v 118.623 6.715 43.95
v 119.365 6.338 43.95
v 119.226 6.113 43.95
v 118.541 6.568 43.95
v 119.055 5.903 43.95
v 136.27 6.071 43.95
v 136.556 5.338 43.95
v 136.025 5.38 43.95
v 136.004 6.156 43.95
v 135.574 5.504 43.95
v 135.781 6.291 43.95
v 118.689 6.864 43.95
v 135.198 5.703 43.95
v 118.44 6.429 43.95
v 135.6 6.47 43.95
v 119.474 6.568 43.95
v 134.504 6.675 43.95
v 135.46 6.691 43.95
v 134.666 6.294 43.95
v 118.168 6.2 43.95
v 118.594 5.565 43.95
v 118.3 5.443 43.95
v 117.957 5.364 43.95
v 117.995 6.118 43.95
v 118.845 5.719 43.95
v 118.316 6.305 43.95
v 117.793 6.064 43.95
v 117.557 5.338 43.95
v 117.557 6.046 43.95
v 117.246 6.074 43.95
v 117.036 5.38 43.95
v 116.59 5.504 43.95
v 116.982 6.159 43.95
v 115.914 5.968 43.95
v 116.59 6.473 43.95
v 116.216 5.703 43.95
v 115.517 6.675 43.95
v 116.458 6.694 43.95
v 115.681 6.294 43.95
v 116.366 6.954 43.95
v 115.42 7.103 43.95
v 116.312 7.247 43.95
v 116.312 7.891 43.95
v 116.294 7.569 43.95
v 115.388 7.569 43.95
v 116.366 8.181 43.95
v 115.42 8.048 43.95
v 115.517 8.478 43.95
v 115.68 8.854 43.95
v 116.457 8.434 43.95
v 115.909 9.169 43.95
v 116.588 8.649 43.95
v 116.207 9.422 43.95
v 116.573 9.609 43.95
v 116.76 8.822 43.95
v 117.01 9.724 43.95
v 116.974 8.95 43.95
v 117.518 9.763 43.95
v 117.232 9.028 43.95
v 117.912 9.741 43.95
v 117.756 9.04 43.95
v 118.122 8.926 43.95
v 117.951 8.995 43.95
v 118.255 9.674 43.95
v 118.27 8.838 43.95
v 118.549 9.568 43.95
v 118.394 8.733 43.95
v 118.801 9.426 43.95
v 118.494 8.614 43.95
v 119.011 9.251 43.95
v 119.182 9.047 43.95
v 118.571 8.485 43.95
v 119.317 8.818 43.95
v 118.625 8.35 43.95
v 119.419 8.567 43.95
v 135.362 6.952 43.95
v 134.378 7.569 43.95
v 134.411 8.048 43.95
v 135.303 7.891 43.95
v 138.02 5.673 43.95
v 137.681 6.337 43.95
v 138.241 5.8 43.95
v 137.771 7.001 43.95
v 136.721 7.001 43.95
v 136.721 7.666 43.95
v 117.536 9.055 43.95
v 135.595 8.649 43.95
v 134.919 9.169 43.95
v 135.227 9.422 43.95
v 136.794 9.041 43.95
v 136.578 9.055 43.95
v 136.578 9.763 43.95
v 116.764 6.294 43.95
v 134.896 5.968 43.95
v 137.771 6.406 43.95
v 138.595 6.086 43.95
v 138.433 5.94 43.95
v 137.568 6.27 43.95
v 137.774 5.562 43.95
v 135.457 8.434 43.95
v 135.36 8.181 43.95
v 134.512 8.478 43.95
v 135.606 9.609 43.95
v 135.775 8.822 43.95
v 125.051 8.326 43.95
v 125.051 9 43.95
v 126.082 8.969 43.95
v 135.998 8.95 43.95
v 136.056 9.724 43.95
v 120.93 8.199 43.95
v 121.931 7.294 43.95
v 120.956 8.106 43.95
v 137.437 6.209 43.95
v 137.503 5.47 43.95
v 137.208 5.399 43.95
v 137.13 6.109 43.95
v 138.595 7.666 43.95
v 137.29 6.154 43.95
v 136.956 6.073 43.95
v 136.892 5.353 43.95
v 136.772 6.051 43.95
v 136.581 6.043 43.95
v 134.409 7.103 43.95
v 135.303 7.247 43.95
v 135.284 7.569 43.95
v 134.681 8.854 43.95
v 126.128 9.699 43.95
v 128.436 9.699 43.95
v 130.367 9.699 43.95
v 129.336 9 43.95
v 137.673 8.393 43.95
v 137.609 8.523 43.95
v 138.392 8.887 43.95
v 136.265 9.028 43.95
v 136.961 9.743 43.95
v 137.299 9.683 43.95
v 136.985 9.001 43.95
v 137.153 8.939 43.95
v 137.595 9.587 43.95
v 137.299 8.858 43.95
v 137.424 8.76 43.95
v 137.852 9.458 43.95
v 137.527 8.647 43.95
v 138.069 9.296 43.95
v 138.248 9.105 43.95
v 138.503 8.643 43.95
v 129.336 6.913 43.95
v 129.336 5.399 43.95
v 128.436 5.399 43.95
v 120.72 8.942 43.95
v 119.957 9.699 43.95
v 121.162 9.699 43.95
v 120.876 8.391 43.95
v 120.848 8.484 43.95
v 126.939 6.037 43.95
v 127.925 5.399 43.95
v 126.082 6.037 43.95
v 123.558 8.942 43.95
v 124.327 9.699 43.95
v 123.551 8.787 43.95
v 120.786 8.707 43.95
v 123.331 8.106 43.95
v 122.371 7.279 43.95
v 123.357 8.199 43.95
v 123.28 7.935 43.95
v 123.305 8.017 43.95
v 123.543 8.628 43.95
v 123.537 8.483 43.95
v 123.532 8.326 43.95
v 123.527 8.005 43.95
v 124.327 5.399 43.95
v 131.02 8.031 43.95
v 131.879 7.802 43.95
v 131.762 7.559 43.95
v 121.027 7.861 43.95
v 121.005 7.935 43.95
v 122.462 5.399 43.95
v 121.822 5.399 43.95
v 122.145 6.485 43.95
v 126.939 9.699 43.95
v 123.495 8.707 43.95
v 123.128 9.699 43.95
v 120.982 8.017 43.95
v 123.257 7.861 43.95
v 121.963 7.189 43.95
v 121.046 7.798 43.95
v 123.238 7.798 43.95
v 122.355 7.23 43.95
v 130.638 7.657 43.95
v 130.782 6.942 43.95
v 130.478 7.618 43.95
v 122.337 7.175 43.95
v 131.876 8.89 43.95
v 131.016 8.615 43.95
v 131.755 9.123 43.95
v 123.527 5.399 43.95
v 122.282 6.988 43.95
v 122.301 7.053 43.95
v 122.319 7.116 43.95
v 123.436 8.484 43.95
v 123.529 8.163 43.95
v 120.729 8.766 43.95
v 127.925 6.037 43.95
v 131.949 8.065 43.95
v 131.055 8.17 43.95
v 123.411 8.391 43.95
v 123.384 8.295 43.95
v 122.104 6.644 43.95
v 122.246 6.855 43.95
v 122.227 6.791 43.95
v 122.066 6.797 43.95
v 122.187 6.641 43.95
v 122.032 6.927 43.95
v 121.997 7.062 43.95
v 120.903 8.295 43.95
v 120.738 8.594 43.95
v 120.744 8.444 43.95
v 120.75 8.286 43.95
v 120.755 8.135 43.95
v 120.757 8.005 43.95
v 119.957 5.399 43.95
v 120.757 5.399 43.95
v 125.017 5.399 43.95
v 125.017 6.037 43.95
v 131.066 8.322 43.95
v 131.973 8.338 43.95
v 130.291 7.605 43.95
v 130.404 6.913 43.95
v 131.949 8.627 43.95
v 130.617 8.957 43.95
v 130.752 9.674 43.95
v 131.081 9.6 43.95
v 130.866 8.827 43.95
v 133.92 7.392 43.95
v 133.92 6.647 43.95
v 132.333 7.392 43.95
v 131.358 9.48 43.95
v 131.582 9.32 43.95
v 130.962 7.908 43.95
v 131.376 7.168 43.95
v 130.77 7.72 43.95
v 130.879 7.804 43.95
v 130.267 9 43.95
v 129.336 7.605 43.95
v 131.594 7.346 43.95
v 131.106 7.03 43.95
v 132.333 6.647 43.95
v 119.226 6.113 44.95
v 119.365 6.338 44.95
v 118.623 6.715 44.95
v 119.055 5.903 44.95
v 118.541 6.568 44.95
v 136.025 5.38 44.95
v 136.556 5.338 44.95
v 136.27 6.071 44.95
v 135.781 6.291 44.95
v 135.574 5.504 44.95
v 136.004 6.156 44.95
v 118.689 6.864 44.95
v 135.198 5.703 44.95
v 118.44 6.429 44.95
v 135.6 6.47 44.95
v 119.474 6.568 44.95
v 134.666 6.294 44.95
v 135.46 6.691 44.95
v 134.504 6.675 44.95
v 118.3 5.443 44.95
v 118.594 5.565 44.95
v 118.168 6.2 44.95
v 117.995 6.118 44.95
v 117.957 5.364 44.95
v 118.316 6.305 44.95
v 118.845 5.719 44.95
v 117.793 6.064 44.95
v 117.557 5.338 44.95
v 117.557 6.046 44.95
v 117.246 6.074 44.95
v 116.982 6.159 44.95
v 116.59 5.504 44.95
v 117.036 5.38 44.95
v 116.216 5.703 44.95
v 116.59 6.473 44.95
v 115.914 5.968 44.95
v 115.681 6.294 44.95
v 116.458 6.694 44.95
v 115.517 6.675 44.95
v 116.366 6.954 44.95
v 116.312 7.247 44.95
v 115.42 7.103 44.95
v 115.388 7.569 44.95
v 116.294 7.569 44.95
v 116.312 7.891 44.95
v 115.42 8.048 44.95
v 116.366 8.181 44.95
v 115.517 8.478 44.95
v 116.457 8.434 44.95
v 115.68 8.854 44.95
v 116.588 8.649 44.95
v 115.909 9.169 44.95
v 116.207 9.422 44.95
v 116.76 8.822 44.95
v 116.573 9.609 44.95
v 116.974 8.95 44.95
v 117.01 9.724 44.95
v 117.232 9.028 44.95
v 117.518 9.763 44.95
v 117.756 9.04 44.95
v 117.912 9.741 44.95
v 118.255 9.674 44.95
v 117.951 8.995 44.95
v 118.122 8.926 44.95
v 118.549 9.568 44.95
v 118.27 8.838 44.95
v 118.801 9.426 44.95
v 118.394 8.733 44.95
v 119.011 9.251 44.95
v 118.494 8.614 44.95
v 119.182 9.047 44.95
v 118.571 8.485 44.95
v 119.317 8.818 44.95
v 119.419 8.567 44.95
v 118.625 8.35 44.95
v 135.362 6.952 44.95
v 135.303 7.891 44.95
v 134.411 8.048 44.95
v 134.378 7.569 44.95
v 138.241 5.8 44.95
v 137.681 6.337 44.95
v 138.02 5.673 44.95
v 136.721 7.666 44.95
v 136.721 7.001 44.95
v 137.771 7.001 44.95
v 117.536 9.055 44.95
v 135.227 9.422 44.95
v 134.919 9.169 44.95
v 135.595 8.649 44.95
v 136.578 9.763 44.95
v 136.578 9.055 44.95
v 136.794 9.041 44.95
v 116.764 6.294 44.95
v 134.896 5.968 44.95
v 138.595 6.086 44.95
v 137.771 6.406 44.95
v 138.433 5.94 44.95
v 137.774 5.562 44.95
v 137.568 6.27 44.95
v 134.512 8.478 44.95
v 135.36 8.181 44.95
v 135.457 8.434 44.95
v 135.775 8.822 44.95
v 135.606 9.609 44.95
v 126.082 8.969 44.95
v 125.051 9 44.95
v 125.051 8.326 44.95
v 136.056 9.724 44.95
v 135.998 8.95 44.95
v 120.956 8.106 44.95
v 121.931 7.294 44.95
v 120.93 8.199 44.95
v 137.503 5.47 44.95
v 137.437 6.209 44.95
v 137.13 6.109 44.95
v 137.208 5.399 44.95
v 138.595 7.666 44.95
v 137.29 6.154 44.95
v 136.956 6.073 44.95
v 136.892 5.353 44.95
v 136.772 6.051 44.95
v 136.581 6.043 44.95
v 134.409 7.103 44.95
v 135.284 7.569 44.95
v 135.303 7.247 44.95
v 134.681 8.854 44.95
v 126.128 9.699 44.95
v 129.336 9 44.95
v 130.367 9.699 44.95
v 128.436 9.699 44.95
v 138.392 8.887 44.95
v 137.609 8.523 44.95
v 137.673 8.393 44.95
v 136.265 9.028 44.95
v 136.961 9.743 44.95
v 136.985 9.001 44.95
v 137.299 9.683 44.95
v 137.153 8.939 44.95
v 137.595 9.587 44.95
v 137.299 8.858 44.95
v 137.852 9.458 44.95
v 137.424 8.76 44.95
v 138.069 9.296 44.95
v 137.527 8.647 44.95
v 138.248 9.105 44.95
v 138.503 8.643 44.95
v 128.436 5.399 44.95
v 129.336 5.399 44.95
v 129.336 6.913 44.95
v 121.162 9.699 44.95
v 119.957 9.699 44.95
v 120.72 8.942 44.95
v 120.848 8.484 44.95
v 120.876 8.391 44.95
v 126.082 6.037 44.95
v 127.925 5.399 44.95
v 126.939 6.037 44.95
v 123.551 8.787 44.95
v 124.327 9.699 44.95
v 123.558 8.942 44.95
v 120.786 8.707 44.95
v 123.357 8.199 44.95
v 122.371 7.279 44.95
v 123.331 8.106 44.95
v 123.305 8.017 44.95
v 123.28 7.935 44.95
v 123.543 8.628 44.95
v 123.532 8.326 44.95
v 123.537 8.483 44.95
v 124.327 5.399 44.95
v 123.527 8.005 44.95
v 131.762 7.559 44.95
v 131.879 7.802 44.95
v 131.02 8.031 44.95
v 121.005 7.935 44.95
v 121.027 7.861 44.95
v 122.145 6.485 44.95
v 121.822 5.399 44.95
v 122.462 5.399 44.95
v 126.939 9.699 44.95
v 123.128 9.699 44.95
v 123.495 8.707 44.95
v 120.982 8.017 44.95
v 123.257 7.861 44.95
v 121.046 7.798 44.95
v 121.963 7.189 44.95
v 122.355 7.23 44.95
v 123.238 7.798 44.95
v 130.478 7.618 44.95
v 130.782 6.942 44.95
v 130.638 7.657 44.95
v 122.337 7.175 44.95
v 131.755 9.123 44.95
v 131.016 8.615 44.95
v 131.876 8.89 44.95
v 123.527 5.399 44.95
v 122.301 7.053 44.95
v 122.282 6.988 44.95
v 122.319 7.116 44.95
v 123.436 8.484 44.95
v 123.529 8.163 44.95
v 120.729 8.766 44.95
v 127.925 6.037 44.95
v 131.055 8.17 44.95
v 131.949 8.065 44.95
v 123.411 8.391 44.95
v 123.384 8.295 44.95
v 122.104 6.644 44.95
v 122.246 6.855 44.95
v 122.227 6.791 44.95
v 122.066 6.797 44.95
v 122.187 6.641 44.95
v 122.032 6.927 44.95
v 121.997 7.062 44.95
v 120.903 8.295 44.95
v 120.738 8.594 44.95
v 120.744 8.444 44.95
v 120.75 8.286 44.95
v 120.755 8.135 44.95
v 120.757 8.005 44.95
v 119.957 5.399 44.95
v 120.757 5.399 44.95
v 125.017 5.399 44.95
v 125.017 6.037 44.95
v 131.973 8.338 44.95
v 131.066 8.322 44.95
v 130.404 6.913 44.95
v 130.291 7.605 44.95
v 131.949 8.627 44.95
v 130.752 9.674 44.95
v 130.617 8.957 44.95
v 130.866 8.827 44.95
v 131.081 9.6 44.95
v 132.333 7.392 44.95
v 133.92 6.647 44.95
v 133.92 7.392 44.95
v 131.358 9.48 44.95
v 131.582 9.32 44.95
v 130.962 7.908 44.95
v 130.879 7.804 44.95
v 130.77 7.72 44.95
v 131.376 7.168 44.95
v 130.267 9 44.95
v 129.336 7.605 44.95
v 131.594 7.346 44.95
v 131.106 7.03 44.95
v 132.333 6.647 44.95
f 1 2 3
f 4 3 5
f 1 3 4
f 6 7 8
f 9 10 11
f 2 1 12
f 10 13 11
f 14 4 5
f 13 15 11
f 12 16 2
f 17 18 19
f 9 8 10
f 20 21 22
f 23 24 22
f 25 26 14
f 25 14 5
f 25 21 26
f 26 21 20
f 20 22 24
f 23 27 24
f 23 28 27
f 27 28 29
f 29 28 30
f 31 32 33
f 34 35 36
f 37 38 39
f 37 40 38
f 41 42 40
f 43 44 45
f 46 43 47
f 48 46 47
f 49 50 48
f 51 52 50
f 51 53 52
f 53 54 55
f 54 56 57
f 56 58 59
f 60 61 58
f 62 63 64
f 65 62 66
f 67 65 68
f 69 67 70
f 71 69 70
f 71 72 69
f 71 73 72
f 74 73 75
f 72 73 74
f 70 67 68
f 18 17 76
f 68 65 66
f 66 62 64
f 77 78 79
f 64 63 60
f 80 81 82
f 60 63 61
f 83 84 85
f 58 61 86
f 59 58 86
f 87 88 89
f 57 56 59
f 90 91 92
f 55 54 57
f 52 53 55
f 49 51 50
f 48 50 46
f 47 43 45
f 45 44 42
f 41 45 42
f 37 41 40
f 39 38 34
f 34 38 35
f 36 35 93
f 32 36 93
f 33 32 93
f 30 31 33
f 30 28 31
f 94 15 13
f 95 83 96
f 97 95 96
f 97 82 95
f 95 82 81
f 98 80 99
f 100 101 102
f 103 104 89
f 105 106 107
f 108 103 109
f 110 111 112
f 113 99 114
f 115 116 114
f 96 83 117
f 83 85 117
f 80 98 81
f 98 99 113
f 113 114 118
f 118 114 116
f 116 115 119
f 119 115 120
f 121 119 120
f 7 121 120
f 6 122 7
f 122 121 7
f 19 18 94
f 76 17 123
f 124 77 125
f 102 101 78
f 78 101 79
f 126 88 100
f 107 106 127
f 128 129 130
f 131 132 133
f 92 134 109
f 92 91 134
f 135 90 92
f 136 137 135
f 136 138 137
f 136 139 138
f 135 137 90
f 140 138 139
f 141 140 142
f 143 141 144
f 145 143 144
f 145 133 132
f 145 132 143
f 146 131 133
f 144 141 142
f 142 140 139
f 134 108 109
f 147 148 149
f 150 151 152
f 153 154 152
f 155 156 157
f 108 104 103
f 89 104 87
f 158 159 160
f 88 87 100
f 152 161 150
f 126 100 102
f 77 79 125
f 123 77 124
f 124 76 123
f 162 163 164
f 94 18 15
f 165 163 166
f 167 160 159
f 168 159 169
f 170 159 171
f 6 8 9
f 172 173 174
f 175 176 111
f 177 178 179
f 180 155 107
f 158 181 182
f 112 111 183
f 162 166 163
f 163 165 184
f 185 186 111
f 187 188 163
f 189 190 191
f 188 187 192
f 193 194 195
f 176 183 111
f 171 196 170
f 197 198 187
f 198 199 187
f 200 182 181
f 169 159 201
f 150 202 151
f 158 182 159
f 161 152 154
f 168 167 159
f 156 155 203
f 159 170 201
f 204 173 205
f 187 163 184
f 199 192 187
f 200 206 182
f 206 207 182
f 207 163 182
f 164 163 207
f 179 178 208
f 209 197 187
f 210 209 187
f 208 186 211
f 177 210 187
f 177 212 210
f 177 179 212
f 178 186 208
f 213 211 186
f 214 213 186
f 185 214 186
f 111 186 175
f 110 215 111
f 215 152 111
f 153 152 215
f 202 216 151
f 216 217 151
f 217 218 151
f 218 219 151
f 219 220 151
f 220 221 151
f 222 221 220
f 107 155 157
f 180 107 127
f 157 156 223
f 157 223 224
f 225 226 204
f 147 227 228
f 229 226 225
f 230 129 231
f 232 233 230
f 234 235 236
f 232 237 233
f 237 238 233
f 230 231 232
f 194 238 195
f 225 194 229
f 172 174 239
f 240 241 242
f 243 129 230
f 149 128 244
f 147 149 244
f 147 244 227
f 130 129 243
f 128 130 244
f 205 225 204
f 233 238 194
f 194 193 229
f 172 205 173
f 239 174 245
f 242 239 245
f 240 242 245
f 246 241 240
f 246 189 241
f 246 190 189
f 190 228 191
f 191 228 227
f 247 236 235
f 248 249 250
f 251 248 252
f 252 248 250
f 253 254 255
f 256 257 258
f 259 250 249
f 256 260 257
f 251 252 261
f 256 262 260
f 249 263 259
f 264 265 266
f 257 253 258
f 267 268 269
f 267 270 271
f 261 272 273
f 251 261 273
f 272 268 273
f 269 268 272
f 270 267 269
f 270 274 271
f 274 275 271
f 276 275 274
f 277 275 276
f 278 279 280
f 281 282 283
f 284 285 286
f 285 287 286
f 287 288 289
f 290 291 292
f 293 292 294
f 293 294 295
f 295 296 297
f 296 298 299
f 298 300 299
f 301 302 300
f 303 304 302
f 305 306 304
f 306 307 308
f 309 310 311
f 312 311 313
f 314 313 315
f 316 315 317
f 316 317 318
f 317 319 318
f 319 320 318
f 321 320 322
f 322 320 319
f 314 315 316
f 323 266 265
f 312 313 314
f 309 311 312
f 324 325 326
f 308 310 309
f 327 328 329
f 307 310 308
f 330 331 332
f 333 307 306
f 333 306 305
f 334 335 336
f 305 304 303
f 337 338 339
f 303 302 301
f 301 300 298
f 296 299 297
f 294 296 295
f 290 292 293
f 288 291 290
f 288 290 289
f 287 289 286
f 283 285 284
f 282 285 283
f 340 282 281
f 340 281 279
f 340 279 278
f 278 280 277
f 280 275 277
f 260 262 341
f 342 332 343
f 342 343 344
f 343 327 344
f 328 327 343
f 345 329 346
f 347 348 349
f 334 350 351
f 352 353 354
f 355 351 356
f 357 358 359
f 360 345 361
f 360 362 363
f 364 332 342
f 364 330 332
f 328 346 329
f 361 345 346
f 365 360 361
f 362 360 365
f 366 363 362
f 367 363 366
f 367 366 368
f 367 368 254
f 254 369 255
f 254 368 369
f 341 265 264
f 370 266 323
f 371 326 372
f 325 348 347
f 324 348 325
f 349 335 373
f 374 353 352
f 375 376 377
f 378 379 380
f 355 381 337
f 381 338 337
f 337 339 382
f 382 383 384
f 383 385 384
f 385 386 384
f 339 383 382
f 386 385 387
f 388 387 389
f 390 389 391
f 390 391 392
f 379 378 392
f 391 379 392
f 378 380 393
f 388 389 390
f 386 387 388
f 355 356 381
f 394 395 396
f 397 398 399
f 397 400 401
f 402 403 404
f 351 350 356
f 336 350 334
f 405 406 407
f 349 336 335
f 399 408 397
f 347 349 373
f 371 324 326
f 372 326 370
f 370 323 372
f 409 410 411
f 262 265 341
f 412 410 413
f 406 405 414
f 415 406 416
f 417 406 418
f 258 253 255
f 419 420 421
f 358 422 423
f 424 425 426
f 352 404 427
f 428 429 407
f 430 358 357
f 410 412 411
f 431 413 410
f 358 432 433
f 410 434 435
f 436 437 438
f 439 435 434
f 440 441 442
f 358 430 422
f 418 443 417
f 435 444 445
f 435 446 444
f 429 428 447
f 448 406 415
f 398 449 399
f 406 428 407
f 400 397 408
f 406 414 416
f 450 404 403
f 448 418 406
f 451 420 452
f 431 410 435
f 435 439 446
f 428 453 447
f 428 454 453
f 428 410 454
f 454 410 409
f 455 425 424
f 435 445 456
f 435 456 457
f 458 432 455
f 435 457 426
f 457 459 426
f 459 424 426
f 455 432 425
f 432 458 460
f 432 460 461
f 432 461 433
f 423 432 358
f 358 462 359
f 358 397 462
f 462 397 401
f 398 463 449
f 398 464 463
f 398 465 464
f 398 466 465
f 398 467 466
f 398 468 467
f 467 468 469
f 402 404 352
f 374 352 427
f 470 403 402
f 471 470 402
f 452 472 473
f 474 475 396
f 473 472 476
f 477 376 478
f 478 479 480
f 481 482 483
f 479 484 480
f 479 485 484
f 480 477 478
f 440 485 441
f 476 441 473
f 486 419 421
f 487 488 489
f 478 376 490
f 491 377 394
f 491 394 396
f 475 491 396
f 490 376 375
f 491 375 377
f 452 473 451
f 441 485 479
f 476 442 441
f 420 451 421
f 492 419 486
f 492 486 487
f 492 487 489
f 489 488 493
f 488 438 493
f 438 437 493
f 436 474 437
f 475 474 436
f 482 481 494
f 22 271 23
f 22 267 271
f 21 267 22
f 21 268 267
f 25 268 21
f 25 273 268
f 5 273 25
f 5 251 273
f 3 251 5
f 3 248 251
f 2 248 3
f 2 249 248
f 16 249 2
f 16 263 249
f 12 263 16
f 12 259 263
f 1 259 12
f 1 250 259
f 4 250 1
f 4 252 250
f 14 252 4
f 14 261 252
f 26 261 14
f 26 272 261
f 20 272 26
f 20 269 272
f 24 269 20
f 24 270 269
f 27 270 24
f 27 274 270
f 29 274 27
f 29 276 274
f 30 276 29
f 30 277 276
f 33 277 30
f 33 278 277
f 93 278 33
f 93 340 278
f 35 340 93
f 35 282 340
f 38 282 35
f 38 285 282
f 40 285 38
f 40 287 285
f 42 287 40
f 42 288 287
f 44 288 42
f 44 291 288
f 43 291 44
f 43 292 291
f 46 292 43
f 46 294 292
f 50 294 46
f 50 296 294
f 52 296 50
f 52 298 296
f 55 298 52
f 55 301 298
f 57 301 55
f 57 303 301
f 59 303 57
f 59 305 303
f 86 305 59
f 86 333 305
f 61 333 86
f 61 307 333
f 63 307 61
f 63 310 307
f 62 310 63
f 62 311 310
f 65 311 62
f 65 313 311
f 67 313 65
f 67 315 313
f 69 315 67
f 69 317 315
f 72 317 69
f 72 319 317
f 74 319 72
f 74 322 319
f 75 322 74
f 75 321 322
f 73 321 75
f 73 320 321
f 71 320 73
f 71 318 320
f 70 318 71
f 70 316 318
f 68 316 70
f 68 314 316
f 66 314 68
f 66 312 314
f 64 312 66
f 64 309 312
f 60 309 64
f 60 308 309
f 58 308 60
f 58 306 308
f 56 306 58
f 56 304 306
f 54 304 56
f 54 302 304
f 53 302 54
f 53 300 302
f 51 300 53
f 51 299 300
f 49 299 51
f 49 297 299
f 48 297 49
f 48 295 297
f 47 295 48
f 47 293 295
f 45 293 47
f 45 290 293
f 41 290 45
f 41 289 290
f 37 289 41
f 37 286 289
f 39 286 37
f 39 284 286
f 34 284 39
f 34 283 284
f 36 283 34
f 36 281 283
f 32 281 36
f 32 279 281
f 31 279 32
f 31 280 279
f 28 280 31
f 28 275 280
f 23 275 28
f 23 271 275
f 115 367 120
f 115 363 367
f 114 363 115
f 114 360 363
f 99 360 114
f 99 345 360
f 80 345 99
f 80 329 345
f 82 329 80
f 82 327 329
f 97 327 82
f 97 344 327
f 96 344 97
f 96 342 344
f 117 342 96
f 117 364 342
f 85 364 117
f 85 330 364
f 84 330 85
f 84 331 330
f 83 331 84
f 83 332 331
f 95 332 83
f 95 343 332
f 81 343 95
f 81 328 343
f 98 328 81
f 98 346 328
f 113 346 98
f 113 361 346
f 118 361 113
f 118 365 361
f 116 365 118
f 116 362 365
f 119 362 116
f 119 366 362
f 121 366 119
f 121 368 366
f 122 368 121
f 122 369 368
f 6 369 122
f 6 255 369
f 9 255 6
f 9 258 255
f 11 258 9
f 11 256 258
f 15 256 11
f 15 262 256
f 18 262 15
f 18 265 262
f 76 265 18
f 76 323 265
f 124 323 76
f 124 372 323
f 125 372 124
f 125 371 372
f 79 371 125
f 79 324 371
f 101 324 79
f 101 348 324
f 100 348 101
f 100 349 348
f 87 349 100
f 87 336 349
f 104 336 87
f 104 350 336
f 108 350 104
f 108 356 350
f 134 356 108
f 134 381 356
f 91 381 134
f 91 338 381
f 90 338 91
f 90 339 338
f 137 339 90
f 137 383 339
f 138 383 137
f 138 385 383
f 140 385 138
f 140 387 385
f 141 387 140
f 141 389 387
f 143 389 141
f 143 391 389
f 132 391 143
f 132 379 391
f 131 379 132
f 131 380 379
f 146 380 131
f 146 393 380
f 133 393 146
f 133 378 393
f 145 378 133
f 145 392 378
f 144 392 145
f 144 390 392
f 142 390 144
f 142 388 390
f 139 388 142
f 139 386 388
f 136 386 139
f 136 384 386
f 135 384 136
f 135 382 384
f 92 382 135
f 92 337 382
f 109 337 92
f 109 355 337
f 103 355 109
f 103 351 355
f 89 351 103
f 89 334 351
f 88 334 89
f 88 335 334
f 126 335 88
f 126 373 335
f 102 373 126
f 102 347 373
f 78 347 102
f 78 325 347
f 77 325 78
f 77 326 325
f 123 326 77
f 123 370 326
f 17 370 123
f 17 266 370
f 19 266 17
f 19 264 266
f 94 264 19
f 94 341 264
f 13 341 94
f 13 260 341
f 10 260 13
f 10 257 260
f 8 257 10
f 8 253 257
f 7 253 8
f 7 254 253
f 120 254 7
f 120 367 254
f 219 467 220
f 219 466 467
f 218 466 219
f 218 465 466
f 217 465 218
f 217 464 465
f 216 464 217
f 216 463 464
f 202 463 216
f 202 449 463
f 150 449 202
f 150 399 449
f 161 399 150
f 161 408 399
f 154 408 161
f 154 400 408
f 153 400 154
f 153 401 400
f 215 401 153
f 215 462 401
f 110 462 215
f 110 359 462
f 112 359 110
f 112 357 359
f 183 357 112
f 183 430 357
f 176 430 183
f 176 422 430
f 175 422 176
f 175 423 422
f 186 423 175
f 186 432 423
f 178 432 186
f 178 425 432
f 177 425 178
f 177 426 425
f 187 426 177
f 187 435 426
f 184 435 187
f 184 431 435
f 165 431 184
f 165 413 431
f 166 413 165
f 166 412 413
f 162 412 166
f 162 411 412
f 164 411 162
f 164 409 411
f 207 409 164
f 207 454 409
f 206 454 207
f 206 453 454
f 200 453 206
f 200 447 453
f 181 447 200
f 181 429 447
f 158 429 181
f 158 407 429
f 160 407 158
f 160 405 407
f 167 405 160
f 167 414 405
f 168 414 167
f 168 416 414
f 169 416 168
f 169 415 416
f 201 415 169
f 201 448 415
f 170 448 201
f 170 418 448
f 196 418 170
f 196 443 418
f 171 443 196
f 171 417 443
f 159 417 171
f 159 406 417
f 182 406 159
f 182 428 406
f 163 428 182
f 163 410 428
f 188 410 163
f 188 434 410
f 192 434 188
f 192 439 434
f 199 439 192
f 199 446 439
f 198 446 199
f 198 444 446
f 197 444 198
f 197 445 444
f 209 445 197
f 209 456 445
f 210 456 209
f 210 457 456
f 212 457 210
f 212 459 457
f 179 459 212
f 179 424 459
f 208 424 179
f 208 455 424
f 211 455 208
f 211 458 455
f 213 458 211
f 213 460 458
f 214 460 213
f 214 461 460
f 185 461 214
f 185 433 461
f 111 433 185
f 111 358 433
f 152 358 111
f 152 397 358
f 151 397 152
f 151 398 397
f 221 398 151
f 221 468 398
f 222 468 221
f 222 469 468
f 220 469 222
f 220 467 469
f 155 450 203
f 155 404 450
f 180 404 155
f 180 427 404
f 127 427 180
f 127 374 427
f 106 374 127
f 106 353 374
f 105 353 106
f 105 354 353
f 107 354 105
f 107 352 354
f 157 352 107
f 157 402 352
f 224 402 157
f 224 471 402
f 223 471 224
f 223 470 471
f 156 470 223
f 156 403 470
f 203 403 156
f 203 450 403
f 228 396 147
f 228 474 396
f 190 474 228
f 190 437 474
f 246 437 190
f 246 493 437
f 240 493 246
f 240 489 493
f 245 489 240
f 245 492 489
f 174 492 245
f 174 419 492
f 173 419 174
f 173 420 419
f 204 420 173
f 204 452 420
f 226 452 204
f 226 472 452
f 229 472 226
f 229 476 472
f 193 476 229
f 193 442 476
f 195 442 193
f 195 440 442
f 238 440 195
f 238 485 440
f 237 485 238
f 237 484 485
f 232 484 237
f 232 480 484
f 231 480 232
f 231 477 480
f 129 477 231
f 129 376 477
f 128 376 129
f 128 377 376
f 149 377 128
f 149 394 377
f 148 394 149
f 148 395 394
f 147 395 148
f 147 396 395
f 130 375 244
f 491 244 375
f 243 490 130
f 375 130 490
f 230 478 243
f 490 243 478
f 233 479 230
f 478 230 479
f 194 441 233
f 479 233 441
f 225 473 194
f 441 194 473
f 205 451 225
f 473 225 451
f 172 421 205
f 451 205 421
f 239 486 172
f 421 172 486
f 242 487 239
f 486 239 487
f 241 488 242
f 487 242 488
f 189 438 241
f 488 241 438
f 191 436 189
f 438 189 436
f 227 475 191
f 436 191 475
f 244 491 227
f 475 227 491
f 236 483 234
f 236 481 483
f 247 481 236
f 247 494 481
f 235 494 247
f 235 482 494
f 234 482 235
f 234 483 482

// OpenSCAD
// CM1P-G ID text, engraved 0.5 into the plate's top face (frame as cm1p_g_freecad.py).
translate([127, 7.5, 43.95]) linear_extrude(1) text("CM1P-G", size = 4.5, font = "Liberation Sans:style=Bold", halign = "center", valign = "center");
